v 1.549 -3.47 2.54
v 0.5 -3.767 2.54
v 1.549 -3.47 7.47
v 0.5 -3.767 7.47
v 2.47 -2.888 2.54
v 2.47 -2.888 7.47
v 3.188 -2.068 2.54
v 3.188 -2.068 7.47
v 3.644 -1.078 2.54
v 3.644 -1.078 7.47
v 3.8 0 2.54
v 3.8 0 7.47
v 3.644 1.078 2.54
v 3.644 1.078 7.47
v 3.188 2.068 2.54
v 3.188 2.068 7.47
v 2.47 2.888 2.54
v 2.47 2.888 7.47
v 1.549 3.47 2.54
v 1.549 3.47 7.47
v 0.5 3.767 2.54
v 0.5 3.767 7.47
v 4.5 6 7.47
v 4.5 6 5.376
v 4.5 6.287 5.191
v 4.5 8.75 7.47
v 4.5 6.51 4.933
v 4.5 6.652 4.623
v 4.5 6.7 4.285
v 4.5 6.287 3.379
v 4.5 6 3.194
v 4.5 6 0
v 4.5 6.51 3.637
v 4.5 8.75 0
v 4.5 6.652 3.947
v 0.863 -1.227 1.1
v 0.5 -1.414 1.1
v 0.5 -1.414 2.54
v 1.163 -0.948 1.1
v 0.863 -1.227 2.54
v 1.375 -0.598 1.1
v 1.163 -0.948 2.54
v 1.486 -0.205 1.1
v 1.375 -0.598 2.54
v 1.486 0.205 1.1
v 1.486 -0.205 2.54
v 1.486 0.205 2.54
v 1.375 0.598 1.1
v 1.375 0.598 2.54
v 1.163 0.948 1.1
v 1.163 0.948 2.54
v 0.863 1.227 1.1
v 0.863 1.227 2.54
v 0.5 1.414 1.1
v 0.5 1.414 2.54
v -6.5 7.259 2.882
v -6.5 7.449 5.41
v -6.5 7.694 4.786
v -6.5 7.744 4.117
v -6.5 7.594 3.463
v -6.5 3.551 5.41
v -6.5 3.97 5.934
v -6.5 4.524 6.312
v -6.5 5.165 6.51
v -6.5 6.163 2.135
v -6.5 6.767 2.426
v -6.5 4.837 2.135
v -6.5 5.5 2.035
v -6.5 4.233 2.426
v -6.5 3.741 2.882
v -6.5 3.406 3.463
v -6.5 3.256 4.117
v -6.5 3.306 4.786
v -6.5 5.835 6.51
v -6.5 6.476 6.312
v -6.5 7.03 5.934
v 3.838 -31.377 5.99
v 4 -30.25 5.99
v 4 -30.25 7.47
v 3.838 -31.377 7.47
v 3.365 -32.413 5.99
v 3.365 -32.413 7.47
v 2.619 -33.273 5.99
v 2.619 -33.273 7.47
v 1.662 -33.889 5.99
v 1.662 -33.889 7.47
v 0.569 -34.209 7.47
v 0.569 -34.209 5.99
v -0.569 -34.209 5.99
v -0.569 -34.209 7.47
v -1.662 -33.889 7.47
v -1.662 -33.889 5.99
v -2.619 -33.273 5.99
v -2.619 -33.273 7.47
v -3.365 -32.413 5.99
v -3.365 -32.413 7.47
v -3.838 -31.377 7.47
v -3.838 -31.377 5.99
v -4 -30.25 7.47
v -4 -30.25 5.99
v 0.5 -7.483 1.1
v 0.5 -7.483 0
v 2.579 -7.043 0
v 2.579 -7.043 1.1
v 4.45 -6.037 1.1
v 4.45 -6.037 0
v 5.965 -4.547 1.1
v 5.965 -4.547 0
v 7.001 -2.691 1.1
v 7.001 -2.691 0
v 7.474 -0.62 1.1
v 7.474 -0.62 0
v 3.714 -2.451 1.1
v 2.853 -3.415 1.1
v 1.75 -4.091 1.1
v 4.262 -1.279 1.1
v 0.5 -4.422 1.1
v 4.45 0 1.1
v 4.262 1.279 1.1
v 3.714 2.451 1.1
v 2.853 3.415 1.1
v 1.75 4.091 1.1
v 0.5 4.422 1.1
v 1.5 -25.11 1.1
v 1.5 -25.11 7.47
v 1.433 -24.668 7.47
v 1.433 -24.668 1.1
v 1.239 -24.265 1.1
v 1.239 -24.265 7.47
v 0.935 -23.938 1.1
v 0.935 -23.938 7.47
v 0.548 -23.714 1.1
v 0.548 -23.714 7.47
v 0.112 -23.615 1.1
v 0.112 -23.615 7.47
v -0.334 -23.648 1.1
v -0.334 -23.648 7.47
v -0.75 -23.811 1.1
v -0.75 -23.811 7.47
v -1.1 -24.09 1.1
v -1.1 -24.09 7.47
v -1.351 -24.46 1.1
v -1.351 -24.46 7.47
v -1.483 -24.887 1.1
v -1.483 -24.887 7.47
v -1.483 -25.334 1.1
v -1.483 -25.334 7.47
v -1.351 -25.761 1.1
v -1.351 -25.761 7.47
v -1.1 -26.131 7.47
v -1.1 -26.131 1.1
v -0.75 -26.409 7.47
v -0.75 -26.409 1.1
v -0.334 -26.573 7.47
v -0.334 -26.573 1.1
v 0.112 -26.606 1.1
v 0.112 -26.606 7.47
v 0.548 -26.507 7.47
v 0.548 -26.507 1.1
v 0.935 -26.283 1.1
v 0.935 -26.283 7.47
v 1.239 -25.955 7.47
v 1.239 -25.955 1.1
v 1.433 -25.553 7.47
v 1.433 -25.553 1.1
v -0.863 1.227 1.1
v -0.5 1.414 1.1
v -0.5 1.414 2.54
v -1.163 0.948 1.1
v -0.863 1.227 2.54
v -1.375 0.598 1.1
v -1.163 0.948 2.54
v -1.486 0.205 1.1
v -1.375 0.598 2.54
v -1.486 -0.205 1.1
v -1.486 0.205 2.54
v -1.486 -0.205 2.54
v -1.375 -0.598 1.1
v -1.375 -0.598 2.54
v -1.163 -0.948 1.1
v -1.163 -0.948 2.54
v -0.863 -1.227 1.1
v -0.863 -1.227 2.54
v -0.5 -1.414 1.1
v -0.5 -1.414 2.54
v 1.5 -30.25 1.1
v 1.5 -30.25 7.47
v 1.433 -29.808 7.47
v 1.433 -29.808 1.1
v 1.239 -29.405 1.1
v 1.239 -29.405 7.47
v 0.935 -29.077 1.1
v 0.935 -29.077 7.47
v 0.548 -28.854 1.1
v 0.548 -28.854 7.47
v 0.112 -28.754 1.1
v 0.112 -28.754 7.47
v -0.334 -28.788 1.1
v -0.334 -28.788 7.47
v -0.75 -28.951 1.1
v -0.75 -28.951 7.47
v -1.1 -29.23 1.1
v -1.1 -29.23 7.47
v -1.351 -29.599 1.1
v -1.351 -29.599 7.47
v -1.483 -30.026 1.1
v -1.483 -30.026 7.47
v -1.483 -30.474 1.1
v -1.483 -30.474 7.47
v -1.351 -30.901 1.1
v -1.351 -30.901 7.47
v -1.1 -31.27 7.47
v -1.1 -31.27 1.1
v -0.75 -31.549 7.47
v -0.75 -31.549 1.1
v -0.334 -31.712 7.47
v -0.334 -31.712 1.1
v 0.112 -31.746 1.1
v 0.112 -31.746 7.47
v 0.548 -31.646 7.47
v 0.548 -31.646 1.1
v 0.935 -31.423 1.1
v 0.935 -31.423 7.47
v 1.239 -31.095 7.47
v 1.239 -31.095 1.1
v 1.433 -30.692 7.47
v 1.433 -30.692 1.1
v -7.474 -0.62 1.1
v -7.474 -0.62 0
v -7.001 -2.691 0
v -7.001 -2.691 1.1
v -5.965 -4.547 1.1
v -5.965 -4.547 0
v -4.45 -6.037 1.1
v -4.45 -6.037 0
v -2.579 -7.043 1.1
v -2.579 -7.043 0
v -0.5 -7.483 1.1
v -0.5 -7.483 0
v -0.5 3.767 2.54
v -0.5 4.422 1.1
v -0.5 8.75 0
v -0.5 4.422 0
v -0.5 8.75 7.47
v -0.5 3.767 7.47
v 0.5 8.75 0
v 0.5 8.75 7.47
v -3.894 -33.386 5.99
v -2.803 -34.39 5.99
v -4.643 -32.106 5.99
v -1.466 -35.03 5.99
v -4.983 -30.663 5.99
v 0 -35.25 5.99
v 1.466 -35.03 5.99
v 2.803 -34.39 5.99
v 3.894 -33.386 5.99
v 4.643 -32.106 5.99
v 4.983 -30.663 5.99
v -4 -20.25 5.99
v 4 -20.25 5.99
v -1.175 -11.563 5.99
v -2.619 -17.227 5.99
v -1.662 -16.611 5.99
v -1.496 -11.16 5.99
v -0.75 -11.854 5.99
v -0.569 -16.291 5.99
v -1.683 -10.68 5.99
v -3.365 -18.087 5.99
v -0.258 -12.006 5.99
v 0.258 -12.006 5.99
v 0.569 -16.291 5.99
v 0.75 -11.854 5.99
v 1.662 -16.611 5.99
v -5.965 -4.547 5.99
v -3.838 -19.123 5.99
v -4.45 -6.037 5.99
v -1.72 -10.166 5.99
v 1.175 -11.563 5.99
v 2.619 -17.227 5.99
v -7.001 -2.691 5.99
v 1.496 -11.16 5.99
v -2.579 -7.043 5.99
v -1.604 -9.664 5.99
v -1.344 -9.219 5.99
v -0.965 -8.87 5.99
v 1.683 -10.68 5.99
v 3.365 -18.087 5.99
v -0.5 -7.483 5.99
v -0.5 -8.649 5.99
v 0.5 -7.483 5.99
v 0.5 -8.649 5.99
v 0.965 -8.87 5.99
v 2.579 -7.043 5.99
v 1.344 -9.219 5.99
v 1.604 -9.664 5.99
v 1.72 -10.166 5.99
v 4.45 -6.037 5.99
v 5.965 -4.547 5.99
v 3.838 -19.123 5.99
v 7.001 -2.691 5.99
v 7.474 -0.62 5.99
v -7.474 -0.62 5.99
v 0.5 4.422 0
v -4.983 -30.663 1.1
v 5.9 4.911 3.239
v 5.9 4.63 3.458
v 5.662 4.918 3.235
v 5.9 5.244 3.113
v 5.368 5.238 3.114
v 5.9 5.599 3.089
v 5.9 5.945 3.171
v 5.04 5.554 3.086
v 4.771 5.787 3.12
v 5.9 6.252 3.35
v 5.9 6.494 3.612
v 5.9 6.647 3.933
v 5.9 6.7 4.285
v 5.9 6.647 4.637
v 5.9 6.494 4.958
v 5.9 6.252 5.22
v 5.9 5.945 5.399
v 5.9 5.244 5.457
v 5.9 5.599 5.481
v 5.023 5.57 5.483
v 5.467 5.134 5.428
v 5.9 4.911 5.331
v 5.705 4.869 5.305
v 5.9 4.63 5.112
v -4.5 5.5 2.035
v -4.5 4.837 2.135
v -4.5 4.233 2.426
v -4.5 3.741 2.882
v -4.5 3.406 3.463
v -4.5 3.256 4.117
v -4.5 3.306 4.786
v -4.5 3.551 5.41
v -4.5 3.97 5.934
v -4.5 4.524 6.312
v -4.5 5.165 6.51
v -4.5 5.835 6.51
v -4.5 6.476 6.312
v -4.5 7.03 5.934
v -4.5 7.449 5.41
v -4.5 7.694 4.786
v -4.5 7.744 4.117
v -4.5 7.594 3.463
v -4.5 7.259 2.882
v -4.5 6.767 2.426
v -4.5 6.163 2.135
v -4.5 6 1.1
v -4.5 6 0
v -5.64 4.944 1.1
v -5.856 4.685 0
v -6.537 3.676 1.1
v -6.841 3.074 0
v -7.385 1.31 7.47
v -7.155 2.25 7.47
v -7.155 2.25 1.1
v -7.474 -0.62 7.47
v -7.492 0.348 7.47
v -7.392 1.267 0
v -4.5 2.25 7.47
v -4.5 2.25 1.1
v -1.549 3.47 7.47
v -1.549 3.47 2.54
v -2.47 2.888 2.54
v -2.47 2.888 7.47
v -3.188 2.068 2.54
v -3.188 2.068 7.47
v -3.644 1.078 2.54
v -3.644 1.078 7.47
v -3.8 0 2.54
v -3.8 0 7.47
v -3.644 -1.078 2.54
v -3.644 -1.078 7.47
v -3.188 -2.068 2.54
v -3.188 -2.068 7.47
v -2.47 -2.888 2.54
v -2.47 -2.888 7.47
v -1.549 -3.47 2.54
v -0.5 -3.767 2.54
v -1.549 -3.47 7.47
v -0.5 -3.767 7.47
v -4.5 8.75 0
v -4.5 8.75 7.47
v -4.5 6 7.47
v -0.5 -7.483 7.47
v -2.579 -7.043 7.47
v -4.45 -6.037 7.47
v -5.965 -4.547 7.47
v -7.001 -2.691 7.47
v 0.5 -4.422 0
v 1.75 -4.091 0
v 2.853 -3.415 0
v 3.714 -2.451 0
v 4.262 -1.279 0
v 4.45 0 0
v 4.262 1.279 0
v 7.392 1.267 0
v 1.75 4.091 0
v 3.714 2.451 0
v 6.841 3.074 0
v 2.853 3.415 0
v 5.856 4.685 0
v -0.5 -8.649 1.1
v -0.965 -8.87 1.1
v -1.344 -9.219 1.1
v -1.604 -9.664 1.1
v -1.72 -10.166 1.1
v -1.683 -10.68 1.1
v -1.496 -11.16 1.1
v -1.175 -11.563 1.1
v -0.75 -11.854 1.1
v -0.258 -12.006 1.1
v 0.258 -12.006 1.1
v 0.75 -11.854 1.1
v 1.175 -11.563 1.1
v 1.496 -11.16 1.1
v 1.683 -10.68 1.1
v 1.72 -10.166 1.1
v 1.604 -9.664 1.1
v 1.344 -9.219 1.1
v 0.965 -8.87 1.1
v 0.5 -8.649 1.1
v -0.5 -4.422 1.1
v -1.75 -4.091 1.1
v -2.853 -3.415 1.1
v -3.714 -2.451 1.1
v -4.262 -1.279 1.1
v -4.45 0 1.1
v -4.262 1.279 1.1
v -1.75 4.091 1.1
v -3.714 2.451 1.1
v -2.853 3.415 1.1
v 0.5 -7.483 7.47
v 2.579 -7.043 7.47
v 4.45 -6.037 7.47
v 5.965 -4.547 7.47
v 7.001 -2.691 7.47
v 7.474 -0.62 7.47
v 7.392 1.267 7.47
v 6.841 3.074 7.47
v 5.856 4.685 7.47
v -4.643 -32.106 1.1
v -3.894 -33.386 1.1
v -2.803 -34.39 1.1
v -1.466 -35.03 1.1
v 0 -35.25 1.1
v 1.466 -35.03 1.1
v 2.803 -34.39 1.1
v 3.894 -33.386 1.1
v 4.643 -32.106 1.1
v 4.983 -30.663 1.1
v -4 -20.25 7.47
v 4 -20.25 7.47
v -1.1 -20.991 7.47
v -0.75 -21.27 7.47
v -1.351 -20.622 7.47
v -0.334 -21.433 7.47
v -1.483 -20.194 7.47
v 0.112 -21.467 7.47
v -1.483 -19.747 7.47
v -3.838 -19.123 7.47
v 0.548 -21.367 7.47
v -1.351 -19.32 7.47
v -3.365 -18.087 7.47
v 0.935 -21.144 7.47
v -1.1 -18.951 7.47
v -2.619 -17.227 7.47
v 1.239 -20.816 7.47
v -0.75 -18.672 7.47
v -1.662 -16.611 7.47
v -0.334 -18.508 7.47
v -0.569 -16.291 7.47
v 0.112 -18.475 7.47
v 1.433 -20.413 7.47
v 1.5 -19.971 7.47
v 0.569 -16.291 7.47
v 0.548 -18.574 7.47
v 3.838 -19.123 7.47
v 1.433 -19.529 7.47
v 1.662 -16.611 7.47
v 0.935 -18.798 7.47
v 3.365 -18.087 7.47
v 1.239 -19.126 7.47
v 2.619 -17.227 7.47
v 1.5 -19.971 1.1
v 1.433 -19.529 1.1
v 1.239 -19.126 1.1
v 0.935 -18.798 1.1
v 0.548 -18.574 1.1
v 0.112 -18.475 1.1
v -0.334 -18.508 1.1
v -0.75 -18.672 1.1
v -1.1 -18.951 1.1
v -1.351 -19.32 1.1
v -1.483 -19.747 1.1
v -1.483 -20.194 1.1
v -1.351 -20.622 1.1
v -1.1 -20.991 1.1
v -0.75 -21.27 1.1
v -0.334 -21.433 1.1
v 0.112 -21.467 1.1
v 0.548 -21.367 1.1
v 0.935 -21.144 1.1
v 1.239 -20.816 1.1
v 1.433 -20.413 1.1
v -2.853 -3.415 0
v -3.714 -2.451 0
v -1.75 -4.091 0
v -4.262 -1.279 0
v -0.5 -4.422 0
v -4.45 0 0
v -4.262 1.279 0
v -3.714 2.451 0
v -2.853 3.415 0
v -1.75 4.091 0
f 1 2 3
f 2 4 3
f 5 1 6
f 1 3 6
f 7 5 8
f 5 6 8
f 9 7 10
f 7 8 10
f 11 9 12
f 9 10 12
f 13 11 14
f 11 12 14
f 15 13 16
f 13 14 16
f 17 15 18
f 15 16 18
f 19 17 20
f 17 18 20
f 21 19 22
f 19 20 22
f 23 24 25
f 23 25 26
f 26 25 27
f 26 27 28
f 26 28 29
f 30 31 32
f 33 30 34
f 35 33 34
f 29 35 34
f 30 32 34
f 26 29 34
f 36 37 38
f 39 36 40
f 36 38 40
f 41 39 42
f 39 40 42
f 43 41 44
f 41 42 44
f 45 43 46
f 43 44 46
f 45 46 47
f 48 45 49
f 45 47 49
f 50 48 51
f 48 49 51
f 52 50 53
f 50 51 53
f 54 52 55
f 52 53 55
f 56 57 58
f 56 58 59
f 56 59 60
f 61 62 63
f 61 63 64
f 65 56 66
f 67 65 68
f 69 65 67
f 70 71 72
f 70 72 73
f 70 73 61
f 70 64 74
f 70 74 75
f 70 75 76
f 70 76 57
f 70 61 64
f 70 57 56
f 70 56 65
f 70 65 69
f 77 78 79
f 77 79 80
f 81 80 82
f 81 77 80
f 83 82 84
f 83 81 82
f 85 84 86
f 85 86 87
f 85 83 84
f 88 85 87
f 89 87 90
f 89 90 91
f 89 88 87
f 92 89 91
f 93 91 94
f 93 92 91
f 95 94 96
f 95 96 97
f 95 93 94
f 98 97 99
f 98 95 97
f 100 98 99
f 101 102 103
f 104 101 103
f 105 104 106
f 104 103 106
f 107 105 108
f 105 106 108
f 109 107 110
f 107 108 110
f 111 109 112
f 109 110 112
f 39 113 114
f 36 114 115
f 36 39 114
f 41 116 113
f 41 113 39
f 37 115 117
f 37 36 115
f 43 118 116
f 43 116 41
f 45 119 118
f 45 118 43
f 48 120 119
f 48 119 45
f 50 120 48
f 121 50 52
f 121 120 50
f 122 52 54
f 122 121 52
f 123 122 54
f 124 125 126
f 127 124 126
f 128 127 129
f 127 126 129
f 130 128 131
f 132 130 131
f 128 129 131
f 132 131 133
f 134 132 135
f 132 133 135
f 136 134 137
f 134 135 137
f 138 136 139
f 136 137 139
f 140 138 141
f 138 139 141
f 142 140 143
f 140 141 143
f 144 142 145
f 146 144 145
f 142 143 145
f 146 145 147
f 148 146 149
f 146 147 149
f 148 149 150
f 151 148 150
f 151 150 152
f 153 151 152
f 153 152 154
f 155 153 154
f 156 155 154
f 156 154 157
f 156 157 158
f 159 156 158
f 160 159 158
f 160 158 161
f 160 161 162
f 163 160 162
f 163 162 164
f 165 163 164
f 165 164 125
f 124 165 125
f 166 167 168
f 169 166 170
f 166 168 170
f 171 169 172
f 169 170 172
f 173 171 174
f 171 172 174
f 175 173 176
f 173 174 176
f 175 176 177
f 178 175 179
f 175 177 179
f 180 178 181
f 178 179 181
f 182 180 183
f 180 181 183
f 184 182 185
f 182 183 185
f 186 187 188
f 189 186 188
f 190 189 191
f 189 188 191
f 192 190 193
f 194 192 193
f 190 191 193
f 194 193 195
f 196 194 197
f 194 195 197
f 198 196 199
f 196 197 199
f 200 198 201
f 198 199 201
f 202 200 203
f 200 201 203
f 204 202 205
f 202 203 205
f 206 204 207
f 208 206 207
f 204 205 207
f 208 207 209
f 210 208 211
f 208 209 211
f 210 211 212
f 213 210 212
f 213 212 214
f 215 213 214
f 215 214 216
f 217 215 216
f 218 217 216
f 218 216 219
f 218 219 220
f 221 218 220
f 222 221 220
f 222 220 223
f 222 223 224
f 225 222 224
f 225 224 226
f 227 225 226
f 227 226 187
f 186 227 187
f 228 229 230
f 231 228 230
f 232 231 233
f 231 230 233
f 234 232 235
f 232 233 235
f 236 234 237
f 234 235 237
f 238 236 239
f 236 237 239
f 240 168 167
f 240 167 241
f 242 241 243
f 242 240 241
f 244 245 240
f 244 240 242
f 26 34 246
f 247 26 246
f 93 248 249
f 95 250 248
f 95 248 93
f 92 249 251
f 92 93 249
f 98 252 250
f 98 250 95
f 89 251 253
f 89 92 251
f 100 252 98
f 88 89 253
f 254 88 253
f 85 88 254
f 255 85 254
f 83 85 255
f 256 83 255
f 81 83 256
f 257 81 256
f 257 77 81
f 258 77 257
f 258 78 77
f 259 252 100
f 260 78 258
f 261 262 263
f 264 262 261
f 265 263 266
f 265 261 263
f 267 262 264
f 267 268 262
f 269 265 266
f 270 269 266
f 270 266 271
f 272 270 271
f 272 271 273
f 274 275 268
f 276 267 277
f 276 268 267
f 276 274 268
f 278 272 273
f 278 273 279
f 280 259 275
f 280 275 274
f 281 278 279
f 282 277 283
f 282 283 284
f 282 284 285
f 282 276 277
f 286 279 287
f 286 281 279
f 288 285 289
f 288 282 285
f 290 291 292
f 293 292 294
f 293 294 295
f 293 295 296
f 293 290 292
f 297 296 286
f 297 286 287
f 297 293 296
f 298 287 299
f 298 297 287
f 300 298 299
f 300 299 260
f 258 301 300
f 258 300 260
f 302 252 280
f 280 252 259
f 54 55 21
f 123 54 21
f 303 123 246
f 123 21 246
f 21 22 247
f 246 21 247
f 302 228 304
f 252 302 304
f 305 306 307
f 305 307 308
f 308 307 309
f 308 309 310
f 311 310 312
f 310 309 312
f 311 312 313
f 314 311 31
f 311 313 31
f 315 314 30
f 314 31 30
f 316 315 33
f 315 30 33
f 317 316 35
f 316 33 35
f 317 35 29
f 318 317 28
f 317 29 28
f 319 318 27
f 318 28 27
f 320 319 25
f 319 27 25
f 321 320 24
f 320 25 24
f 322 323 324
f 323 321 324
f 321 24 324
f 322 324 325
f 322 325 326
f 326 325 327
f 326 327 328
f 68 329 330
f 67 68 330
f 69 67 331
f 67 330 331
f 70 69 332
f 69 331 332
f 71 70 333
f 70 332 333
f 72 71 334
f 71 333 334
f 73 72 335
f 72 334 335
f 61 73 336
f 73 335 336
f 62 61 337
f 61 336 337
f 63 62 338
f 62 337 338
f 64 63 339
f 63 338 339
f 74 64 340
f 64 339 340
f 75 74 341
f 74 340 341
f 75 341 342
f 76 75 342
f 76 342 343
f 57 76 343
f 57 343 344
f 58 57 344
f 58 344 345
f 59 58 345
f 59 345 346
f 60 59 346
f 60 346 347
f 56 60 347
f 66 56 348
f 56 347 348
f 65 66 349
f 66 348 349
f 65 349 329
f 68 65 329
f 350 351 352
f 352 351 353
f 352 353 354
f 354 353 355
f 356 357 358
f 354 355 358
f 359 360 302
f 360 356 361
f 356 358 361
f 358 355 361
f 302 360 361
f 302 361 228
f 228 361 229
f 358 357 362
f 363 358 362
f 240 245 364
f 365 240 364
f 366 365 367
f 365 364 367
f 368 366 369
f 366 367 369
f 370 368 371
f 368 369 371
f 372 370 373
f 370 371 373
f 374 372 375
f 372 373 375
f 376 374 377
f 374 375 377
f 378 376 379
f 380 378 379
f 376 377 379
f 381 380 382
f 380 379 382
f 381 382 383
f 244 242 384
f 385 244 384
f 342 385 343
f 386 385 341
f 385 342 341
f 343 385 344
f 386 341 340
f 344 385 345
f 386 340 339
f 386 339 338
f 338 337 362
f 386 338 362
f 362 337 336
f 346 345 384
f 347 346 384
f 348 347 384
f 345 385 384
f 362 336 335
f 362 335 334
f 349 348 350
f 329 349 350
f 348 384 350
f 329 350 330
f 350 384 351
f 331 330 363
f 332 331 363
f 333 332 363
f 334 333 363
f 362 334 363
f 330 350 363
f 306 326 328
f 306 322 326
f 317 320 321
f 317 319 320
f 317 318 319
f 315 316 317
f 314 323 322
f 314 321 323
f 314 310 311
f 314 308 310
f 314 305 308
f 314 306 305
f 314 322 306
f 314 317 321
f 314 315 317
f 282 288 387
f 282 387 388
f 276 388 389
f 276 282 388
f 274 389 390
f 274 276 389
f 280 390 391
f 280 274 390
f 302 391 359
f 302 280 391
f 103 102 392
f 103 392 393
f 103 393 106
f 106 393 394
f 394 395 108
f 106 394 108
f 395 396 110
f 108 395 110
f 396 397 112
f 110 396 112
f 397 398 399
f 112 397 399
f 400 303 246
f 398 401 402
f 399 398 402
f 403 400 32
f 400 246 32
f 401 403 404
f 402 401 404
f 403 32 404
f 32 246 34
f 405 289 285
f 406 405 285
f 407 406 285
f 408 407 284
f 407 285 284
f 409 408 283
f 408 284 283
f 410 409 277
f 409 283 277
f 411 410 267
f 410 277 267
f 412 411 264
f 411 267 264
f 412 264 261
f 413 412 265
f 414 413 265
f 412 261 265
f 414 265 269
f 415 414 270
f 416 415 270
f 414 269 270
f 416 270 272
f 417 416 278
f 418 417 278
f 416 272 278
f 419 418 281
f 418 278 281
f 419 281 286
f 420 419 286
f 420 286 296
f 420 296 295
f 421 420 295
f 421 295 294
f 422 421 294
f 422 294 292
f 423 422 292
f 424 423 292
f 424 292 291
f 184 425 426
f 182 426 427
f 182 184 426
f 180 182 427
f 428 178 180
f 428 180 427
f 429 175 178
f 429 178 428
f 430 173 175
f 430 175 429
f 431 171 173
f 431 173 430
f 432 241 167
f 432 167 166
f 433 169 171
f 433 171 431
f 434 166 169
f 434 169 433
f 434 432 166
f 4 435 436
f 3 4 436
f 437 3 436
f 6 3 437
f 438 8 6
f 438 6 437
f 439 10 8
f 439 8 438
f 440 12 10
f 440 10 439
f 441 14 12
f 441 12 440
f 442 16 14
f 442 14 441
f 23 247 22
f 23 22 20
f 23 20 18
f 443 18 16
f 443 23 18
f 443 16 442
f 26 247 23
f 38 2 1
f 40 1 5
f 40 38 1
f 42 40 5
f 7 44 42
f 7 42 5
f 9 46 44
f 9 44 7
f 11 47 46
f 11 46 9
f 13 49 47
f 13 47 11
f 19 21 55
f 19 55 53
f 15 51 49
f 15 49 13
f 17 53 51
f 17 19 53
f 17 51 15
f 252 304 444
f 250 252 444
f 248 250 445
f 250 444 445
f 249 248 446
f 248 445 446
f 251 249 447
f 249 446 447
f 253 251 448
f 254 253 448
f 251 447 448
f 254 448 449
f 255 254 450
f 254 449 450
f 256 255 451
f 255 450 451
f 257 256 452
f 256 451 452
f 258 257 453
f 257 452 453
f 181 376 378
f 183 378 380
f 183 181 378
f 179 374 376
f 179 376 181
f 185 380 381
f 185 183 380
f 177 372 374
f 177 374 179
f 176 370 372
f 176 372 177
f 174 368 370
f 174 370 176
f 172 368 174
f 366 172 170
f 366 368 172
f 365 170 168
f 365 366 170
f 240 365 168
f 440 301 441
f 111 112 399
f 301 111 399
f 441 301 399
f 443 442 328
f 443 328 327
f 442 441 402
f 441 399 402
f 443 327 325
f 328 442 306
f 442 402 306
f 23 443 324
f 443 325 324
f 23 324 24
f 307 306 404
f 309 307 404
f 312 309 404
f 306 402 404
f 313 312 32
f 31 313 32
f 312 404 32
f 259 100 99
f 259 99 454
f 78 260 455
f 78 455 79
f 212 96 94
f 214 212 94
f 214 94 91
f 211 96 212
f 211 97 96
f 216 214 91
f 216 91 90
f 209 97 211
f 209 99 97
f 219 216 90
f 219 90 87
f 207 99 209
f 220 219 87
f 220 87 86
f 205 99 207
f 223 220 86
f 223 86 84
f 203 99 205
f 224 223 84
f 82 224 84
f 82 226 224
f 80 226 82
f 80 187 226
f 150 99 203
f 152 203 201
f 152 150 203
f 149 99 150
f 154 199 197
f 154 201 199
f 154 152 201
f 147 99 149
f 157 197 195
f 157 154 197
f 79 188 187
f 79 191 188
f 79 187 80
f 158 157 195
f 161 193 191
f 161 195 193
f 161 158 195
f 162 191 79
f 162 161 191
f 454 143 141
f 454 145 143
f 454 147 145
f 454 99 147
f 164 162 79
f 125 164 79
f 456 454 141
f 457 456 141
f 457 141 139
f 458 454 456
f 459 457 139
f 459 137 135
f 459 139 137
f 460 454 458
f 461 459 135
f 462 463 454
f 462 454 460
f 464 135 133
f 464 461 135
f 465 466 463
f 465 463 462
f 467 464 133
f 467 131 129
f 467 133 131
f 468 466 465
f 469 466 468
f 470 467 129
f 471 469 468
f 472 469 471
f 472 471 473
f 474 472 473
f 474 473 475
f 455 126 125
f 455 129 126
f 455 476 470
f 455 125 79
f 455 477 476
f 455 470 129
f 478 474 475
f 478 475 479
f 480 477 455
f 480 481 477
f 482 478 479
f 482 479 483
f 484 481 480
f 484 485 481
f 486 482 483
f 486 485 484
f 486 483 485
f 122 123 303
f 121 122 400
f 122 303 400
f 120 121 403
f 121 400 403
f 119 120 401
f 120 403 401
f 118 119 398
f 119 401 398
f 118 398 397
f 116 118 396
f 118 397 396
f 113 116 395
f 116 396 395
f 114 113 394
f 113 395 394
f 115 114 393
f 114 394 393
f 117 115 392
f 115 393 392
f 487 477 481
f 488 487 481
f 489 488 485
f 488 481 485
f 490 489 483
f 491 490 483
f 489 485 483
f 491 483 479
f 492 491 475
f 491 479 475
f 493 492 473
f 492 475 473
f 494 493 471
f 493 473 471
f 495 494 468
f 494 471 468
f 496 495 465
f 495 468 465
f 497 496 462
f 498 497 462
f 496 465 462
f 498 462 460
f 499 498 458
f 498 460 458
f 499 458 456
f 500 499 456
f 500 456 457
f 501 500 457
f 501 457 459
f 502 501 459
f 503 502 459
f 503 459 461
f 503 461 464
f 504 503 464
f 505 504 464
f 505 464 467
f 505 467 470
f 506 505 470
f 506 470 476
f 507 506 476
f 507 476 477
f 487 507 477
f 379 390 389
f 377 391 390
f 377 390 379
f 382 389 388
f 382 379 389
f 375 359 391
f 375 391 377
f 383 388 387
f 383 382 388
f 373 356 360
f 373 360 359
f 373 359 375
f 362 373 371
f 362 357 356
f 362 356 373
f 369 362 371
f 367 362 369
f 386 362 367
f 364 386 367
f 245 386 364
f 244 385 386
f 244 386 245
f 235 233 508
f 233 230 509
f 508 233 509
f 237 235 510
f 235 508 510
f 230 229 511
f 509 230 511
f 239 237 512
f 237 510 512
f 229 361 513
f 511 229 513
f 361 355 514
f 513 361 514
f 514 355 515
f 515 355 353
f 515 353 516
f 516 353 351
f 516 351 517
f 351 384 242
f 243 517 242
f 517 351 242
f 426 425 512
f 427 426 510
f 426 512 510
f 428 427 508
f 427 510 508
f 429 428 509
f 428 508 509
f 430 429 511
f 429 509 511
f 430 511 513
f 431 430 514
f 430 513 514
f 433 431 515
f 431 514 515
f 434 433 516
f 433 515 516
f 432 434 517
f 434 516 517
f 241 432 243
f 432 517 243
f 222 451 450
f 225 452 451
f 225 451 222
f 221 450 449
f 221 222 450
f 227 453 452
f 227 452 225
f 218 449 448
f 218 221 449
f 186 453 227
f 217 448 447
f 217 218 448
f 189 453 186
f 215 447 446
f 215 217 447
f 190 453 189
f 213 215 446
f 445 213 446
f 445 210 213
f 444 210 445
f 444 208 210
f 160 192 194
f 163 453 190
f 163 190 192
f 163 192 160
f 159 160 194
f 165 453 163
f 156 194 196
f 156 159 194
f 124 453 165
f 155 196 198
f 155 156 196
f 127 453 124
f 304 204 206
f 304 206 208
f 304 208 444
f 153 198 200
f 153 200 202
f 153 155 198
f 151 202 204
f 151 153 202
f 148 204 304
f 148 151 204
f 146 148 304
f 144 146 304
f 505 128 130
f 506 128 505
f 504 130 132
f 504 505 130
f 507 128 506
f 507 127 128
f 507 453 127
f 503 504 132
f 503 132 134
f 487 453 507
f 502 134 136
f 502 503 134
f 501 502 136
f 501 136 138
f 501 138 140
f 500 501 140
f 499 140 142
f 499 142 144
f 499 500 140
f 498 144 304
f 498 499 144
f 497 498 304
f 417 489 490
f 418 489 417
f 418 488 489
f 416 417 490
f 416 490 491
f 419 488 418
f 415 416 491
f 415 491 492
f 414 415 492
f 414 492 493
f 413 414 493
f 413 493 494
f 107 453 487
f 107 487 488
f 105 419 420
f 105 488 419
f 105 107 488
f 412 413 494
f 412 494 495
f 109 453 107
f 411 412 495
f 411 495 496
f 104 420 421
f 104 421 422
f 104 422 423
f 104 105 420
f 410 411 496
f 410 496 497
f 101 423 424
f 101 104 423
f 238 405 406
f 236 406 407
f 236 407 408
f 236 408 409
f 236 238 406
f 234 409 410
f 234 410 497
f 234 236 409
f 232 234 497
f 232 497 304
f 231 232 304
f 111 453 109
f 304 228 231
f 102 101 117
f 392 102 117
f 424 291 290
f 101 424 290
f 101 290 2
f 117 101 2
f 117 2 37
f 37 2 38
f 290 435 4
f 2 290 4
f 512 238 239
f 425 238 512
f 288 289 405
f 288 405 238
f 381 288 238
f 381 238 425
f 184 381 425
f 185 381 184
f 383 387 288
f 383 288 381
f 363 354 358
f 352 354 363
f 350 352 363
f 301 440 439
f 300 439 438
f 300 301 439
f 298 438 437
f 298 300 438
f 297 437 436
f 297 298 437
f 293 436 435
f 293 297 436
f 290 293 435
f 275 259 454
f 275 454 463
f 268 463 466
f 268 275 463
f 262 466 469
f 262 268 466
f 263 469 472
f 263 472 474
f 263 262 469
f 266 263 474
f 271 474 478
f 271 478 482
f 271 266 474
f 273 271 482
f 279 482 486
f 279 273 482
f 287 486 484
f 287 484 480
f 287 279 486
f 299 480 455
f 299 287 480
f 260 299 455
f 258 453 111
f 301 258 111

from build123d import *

# Parameters (mm, degrees)
SALIENTE_EXTRUIR1_DEPTH = 7.47
CORTAR_EXTRUIR1_START   = -1.48
CORTAR_EXTRUIR1_DEPTH   = 1.48
CORTAR_EXTRUIR2_DEPTH   = 1.1
CROQUIS4_R              = 1.5
CORTAR_EXTRUIR4_DEPTH   = 37.80507302
CROQUIS7_R              = 1.725
CORTAR_EXTRUIR5_DEPTH   = 37.533444951
CROQUIS9_W              = 1
CROQUIS9_H              = 19.05
CORTAR_EXTRUIR6_DEPTH   = 37.80507302
CROQUIS10_R             = 3.8
CORTAR_EXTRUIR7_DEPTH   = 4.93
CROQUIS11_R             = 1.5
CORTAR_EXTRUIR8_DEPTH   = 37.374680755
CROQUIS12_R             = 4.45
CORTAR_EXTRUIR9_DEPTH   = 1.1
CROQUIS14_W             = 2.654544011
CROQUIS14_H             = 6.5
CORTAR_EXTRUIR10_DEPTH  = 6.37
CROQUIS15_R             = 2.25
SALIENTE_EXTRUIR2_DEPTH = 2
CROQUIS16_R             = 1.2
SALIENTE_EXTRUIR3_DEPTH = 1.4


with BuildPart() as part:
    # Croquis1 → Saliente-Extruir1 (new body)
    with BuildSketch(Plane.XY):
        with BuildLine():
            Line((4.5, 6), (4.5, 8.75))
            Line((4.5, 8.75), (-4.5, 8.75))
            Line((-4.5, 8.75), (-4.5, 6))
            ThreePointArc((-4.5, 6), (-6.841182363, 3.073796329), (-7.47434311, -0.619834711))
            Line((-7.47434311, -0.619834711), (-4.982895407, -30.66322314))
            ThreePointArc((-4.982895407, -30.66322314), (0, -35.25), (4.982895407, -30.66322314))
            Line((4.982895407, -30.66322314), (7.47434311, -0.619834711))
            ThreePointArc((7.47434311, -0.619834711), (6.841182363, 3.073796329), (4.5, 6))
        make_face()
    extrude(amount=SALIENTE_EXTRUIR1_DEPTH)

    # Croquis2 → Cortar-Extruir1 (cut)
    with BuildSketch(Plane.XY.offset(7.47).offset(CORTAR_EXTRUIR1_START)):
        with BuildLine():
            ThreePointArc((7.47434311, -0.619834711), (0, -7.5), (-7.47434311, -0.619834711))
            Line((-7.47434311, -0.619834711), (-4.982895407, -30.66322314))
            ThreePointArc((-4.982895407, -30.66322314), (0, -35.25), (4.982895407, -30.66322314))
            Line((4.982895407, -30.66322314), (7.47434311, -0.619834711))
        make_face()
        with BuildLine():
            ThreePointArc((4, -30.25), (0, -34.25), (-4, -30.25))
            Line((-4, -30.25), (-4, -20.25))
            ThreePointArc((-4, -20.25), (0, -16.25), (4, -20.25))
            Line((4, -20.25), (4, -30.25))
        make_face(mode=Mode.SUBTRACT)
    extrude(amount=CORTAR_EXTRUIR1_DEPTH, mode=Mode.SUBTRACT)

    # Croquis3 → Cortar-Extruir2 (cut)
    with BuildSketch(Plane(origin=(0, 0, 0), x_dir=(-1, 0, 0), z_dir=(0, 0, -1))):
        with BuildLine():
            Line((-7.47434311, -0.619834711), (-4.982895407, -30.66322314))
            ThreePointArc((-4.982895407, -30.66322314), (0, -35.25), (4.982895407, -30.66322314))
            Line((4.982895407, -30.66322314), (7.47434311, -0.619834711))
            ThreePointArc((7.47434311, -0.619834711), (0, -7.5), (-7.47434311, -0.619834711))
        make_face()
    extrude(amount=-CORTAR_EXTRUIR2_DEPTH, mode=Mode.SUBTRACT)

    # Croquis4 → Cortar-Extruir4 (cut, through all)
    with BuildSketch(Plane.XY.offset(7.47)):
        with Locations((0, -19.970784247)):
            Circle(CROQUIS4_R)
        with Locations((0, -25.110392124)):
            Circle(CROQUIS4_R)
        with Locations((0, -30.25)):
            Circle(CROQUIS4_R)
    extrude(amount=-CORTAR_EXTRUIR4_DEPTH, mode=Mode.SUBTRACT)

    # Croquis7 → Cortar-Extruir5 (cut, through all)
    with BuildSketch(Plane.XY.offset(5.99)):
        with Locations((0, -10.3)):
            Circle(CROQUIS7_R)
    extrude(amount=-CORTAR_EXTRUIR5_DEPTH, mode=Mode.SUBTRACT)

    # Croquis9 → Cortar-Extruir6 (cut, through all)
    with BuildSketch(Plane.XY.offset(7.47)):
        with Locations((0, -0.775)):
            Rectangle(CROQUIS9_W, CROQUIS9_H)
    extrude(amount=-CORTAR_EXTRUIR6_DEPTH, mode=Mode.SUBTRACT)

    # Croquis10 → Cortar-Extruir7 (cut)
    with BuildSketch(Plane.XY.offset(7.47)):
        Circle(CROQUIS10_R)
    extrude(amount=-CORTAR_EXTRUIR7_DEPTH, mode=Mode.SUBTRACT)

    # Croquis11 → Cortar-Extruir8 (cut, through all)
    with BuildSketch(Plane.XY.offset(2.54)):
        Circle(CROQUIS11_R)
    extrude(amount=-CORTAR_EXTRUIR8_DEPTH, mode=Mode.SUBTRACT)

    # Croquis12 → Cortar-Extruir9 (cut)
    with BuildSketch(Plane(origin=(0, 0, 0), x_dir=(-1, 0, 0), z_dir=(0, 0, -1))):
        Circle(CROQUIS12_R)
    extrude(amount=-CORTAR_EXTRUIR9_DEPTH, mode=Mode.SUBTRACT)

    # Croquis14 → Cortar-Extruir10 (cut)
    with BuildSketch(Plane.XY.offset(7.47)):
        with Locations((-5.827272006, 5.5)):
            Rectangle(CROQUIS14_W, CROQUIS14_H)
    extrude(amount=-CORTAR_EXTRUIR10_DEPTH, mode=Mode.SUBTRACT)

    # Croquis15 → Saliente-Extruir2 (add)
    with BuildSketch(Plane.ZY.offset(4.5)):
        with Locations(Location((4.285, 5.5, 0), (0, 0, 180))):
            Circle(CROQUIS15_R)
    extrude(amount=SALIENTE_EXTRUIR2_DEPTH)

    # Croquis16 → Saliente-Extruir3 (add)
    with BuildSketch(Plane(origin=(4.5, 0, 0), x_dir=(0, 0, -1), z_dir=(1, 0, 0))):
        with Locations((-4.285, 5.5)):
            Circle(CROQUIS16_R)
    extrude(amount=SALIENTE_EXTRUIR3_DEPTH)


solid = part.part
